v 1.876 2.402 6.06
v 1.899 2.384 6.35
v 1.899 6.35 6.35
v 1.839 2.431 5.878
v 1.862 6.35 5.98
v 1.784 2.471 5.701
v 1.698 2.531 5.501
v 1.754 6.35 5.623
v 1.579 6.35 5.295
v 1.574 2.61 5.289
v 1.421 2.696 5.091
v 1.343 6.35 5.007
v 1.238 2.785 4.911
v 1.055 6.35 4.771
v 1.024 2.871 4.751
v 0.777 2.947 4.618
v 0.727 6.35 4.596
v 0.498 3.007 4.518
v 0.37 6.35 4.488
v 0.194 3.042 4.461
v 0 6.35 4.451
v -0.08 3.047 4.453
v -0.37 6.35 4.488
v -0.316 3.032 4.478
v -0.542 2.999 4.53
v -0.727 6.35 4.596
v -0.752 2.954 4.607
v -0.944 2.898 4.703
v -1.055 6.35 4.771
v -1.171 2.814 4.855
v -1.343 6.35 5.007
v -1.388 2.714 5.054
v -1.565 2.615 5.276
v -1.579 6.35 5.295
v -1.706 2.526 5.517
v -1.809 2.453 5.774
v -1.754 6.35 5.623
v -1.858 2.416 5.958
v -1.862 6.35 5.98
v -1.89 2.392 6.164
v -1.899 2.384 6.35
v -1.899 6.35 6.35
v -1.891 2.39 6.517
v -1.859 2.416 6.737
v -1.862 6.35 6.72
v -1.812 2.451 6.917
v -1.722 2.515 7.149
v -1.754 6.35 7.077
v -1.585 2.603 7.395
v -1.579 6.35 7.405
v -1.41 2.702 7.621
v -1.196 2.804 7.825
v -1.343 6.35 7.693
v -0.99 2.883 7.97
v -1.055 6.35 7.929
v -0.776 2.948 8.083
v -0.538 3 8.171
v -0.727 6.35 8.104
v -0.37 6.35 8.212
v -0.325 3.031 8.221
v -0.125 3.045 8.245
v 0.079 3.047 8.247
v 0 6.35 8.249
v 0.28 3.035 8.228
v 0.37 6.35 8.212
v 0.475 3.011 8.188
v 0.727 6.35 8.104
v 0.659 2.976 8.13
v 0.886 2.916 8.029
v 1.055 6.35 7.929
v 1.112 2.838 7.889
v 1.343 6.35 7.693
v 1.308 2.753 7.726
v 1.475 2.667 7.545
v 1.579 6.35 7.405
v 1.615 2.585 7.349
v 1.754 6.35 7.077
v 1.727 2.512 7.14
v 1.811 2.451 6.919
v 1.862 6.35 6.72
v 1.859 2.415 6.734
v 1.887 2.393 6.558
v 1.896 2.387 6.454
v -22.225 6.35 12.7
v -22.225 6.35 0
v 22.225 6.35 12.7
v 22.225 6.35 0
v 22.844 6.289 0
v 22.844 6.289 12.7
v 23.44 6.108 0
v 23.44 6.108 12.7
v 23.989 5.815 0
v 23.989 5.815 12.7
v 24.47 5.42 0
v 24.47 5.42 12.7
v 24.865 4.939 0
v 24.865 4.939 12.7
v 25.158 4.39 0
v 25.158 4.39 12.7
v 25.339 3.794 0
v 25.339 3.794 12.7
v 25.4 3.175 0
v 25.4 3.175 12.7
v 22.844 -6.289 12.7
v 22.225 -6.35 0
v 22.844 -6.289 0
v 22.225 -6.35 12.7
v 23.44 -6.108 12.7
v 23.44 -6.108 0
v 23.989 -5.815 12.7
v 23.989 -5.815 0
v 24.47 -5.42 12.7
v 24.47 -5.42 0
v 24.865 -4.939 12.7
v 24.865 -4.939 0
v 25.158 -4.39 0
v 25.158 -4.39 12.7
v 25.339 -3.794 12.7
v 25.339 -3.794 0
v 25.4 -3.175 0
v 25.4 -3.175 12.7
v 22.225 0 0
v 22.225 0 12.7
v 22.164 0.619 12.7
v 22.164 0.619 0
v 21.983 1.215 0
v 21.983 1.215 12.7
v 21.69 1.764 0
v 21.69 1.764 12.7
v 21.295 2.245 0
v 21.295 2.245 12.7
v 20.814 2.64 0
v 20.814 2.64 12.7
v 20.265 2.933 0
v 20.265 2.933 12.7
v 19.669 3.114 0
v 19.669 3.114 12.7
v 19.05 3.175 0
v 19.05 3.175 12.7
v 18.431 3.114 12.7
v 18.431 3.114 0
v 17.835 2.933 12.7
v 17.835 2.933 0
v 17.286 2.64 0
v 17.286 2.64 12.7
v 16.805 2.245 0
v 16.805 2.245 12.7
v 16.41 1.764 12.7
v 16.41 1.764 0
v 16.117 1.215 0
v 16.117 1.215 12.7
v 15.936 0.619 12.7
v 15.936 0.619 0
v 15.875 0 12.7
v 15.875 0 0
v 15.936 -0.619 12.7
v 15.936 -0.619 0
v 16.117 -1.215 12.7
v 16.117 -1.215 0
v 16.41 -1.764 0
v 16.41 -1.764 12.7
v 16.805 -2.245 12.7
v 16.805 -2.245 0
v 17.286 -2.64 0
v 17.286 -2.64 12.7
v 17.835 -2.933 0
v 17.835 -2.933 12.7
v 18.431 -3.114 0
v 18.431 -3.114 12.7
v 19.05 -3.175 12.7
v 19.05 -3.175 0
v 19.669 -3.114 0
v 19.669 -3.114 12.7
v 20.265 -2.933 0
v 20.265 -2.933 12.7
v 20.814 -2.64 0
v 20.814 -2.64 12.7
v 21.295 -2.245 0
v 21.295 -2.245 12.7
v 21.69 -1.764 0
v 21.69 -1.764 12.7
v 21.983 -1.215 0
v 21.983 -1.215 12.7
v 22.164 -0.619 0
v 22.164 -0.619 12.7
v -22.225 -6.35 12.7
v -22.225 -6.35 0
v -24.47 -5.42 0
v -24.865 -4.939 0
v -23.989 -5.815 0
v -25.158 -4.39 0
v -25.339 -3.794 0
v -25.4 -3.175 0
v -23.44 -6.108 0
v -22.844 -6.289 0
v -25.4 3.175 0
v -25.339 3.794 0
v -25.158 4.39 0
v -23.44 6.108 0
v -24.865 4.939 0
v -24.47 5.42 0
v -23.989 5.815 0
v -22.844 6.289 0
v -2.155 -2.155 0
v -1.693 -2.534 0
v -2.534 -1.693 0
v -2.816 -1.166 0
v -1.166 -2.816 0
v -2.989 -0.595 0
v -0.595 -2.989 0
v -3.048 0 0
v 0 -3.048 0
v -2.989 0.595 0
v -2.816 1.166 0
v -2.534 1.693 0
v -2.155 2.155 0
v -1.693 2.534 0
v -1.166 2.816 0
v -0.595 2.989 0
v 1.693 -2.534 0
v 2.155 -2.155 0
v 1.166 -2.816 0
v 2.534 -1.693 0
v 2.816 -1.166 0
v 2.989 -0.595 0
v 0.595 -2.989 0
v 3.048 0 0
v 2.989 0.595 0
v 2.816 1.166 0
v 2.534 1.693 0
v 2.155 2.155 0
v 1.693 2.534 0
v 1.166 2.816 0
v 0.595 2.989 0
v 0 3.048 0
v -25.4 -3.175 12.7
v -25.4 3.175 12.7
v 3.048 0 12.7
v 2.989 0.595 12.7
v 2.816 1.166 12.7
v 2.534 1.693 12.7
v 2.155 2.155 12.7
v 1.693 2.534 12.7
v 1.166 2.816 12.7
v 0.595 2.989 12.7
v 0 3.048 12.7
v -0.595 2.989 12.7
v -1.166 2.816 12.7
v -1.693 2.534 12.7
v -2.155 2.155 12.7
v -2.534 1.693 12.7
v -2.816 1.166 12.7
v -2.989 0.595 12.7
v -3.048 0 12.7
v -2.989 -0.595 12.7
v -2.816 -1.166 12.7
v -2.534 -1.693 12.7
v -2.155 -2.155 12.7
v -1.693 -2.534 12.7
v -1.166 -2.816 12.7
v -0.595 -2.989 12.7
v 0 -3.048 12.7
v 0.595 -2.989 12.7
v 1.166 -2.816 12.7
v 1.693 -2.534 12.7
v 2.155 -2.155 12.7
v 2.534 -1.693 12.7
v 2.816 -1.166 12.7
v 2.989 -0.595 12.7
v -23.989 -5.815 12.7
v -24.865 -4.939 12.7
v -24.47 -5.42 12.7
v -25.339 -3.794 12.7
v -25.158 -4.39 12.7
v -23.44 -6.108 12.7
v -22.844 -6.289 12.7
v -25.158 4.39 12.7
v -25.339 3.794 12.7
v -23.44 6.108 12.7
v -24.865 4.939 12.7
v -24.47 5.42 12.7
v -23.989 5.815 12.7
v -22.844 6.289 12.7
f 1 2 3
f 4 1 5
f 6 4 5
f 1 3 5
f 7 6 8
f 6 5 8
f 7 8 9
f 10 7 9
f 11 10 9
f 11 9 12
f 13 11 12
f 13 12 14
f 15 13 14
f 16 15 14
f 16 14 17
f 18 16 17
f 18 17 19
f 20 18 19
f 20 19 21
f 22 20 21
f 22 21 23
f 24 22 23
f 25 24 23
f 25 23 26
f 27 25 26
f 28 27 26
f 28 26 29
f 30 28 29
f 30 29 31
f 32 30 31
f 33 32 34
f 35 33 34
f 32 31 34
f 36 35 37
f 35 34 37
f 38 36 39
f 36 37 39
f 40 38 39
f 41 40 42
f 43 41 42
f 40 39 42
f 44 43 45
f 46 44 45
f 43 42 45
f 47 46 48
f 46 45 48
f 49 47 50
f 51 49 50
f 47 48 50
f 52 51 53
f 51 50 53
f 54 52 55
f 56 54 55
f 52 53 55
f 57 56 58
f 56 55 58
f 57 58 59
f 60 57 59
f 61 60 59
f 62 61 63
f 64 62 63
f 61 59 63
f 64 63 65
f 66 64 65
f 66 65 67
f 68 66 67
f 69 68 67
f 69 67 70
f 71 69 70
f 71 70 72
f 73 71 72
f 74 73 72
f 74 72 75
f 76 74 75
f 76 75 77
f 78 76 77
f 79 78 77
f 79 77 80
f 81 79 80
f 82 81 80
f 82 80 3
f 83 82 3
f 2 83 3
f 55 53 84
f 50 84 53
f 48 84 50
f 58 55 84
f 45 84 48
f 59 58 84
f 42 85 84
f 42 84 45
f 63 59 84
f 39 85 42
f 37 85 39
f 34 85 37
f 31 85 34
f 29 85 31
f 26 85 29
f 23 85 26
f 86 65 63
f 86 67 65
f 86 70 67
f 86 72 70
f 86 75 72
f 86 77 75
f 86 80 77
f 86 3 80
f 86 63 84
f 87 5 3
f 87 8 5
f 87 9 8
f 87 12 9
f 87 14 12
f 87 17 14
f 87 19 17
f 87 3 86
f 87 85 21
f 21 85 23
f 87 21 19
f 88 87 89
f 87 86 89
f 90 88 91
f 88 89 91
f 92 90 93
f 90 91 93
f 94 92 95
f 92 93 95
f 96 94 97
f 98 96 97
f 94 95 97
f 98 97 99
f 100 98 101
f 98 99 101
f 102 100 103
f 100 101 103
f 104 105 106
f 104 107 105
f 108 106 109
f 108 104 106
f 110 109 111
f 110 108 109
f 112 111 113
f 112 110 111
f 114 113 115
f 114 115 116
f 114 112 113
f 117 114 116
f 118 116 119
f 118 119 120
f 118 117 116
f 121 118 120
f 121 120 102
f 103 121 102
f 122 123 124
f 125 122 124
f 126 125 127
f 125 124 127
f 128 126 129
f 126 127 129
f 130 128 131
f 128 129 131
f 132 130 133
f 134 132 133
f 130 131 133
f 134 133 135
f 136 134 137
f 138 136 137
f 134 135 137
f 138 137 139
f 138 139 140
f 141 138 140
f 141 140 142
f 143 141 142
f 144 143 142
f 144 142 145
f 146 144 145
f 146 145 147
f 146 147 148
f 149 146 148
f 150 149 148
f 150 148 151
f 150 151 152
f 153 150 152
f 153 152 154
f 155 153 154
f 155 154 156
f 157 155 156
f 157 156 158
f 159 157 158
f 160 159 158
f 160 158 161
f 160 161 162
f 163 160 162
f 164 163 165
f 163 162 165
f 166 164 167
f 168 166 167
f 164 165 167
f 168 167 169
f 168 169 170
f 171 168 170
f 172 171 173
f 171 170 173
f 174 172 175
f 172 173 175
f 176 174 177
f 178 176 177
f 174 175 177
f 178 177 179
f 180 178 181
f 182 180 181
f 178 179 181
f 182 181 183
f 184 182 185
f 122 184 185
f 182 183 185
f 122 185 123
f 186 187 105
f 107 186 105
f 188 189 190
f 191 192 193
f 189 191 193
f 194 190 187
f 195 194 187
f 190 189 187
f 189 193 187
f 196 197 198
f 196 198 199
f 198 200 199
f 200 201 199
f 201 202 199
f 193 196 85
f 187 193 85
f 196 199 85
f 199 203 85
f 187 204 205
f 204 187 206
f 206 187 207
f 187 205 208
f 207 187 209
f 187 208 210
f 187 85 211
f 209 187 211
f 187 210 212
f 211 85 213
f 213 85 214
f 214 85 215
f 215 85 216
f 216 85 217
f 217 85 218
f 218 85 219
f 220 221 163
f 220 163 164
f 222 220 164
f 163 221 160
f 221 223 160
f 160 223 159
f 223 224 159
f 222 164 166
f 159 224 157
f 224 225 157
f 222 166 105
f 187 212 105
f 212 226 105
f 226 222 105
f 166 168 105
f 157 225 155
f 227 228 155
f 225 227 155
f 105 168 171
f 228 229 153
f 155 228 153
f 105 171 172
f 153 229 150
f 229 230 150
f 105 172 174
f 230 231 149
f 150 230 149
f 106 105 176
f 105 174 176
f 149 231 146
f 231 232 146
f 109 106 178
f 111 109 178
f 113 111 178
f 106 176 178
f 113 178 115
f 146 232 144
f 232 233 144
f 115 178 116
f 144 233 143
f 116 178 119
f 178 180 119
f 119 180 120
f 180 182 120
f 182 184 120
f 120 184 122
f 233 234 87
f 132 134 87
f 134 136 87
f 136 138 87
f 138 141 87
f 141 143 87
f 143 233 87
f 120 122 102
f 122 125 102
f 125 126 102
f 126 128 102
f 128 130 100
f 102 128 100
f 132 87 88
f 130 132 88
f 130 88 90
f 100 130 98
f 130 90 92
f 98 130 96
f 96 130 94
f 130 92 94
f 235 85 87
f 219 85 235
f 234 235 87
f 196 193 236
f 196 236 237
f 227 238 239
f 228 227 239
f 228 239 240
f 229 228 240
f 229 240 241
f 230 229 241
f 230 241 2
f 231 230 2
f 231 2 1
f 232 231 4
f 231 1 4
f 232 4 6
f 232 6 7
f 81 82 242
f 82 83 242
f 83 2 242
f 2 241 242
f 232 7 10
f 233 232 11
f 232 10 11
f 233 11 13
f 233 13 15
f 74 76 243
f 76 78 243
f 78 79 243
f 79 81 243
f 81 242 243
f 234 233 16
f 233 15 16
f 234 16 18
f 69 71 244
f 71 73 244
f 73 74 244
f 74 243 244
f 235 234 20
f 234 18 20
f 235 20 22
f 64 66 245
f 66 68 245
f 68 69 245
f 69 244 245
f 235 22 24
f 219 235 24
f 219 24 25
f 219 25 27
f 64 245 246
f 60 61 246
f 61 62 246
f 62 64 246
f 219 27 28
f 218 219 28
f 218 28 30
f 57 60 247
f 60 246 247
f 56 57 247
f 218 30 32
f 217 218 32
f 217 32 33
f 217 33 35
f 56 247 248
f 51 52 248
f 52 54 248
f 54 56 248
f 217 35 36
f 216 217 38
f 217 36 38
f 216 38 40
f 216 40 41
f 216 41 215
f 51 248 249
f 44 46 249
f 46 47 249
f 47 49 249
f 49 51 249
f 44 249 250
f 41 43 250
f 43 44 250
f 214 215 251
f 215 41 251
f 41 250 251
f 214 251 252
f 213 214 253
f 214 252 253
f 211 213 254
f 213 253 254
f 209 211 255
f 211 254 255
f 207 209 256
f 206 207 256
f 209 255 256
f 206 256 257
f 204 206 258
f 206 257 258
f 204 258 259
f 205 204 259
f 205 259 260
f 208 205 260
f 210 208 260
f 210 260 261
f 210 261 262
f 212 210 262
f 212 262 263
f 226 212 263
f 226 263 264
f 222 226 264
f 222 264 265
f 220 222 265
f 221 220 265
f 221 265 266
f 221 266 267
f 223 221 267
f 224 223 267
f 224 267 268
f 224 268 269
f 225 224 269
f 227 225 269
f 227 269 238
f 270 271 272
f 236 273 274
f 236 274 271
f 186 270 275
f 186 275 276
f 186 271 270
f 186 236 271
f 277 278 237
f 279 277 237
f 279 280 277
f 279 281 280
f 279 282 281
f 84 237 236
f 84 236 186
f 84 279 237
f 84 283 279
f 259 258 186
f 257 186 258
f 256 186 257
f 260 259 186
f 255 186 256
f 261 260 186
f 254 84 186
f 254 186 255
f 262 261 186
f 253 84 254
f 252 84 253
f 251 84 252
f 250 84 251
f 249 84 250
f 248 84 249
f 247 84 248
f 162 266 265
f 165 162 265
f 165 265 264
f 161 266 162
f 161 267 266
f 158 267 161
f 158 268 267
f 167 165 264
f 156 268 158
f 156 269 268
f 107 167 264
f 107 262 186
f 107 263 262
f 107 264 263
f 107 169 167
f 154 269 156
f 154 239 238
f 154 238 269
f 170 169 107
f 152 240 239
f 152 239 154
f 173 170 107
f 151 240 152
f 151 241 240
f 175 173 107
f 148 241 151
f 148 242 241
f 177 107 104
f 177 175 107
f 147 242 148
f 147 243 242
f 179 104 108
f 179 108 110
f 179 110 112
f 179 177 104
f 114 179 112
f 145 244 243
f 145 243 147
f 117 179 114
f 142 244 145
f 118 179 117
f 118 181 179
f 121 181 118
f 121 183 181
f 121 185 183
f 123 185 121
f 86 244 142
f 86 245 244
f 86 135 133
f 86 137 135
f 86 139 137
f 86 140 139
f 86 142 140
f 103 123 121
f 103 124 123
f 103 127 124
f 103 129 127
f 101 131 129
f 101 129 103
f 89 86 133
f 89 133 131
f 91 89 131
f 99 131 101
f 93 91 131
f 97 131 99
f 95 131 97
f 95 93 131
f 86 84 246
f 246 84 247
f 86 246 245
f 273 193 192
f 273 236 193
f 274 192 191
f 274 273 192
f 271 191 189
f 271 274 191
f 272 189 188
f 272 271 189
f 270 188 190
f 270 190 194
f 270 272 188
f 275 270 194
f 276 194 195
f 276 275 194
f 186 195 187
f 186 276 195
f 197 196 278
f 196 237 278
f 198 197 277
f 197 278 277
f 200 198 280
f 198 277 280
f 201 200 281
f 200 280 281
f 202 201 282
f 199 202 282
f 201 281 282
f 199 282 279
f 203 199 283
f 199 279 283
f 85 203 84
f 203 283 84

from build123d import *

# Parameters (mm, degrees)
SKETCH1_W                       = 50.8
SKETCH1_H                       = 12.7
BOSS_EXTRUDE1_DEPTH             = 12.7
SKETCH4_R                       = 3.048
CUT_EXTRUDE1_DEPTH              = 50.8
SKETCH6_R                       = 3.175
CUT_EXTRUDE2_DEPTH              = 50.8
TAP_DRILL_FOR_10_24_TAP1_REACH  = 31.099
TAP_DRILL_FOR_10_24_TAP1_BORE_R = 1.89865
FILLET1_R                       = 3.175


with BuildPart() as part:
    # Sketch1 → Boss-Extrude1 (new body)
    with BuildSketch(Plane.XY):
        Rectangle(SKETCH1_W, SKETCH1_H)
    extrude(amount=BOSS_EXTRUDE1_DEPTH)

    # Sketch4 → Cut-Extrude1 (cut)
    with BuildSketch(Plane.XY.offset(12.7)):
        Circle(SKETCH4_R)
    extrude(amount=-CUT_EXTRUDE1_DEPTH, mode=Mode.SUBTRACT)

    # Sketch6 → Cut-Extrude2 (cut)
    with BuildSketch(Plane.XY.offset(12.7)):
        with Locations((19.05, 0)):
            Circle(SKETCH6_R)
    extrude(amount=-CUT_EXTRUDE2_DEPTH, mode=Mode.SUBTRACT)

    # Tap Drill for #10-24 Tap1 bore (on position points) → Tap Drill for #10-24 Tap1 (cut, up to next)
    with BuildSketch(Plane(origin=(0, 6.35, 6.35), x_dir=(1, 0, 0), z_dir=(0, 1, 0)), mode=Mode.PRIVATE) as tap_drill_for_10_24_tap1_sk1:
        Circle(TAP_DRILL_FOR_10_24_TAP1_BORE_R)
    tap_drill_for_10_24_tap1_tool1 = extrude(tap_drill_for_10_24_tap1_sk1.sketch, amount=-TAP_DRILL_FOR_10_24_TAP1_REACH, mode=Mode.PRIVATE) & part.part
    add(tap_drill_for_10_24_tap1_tool1.solids().sort_by_distance((0, 6.35, 6.35))[0], mode=Mode.SUBTRACT)

    # Fillet1
    fillet1_edges = [part.edges().sort_by_distance(p)[0] for p in [
        (-25.4, 6.35, 6.35),
        (25.4, 6.35, 6.35),
        (25.4, -6.35, 6.35),
        (-25.4, -6.35, 6.35),
    ]]
    fillet(fillet1_edges, radius=FILLET1_R)


solid = part.part
